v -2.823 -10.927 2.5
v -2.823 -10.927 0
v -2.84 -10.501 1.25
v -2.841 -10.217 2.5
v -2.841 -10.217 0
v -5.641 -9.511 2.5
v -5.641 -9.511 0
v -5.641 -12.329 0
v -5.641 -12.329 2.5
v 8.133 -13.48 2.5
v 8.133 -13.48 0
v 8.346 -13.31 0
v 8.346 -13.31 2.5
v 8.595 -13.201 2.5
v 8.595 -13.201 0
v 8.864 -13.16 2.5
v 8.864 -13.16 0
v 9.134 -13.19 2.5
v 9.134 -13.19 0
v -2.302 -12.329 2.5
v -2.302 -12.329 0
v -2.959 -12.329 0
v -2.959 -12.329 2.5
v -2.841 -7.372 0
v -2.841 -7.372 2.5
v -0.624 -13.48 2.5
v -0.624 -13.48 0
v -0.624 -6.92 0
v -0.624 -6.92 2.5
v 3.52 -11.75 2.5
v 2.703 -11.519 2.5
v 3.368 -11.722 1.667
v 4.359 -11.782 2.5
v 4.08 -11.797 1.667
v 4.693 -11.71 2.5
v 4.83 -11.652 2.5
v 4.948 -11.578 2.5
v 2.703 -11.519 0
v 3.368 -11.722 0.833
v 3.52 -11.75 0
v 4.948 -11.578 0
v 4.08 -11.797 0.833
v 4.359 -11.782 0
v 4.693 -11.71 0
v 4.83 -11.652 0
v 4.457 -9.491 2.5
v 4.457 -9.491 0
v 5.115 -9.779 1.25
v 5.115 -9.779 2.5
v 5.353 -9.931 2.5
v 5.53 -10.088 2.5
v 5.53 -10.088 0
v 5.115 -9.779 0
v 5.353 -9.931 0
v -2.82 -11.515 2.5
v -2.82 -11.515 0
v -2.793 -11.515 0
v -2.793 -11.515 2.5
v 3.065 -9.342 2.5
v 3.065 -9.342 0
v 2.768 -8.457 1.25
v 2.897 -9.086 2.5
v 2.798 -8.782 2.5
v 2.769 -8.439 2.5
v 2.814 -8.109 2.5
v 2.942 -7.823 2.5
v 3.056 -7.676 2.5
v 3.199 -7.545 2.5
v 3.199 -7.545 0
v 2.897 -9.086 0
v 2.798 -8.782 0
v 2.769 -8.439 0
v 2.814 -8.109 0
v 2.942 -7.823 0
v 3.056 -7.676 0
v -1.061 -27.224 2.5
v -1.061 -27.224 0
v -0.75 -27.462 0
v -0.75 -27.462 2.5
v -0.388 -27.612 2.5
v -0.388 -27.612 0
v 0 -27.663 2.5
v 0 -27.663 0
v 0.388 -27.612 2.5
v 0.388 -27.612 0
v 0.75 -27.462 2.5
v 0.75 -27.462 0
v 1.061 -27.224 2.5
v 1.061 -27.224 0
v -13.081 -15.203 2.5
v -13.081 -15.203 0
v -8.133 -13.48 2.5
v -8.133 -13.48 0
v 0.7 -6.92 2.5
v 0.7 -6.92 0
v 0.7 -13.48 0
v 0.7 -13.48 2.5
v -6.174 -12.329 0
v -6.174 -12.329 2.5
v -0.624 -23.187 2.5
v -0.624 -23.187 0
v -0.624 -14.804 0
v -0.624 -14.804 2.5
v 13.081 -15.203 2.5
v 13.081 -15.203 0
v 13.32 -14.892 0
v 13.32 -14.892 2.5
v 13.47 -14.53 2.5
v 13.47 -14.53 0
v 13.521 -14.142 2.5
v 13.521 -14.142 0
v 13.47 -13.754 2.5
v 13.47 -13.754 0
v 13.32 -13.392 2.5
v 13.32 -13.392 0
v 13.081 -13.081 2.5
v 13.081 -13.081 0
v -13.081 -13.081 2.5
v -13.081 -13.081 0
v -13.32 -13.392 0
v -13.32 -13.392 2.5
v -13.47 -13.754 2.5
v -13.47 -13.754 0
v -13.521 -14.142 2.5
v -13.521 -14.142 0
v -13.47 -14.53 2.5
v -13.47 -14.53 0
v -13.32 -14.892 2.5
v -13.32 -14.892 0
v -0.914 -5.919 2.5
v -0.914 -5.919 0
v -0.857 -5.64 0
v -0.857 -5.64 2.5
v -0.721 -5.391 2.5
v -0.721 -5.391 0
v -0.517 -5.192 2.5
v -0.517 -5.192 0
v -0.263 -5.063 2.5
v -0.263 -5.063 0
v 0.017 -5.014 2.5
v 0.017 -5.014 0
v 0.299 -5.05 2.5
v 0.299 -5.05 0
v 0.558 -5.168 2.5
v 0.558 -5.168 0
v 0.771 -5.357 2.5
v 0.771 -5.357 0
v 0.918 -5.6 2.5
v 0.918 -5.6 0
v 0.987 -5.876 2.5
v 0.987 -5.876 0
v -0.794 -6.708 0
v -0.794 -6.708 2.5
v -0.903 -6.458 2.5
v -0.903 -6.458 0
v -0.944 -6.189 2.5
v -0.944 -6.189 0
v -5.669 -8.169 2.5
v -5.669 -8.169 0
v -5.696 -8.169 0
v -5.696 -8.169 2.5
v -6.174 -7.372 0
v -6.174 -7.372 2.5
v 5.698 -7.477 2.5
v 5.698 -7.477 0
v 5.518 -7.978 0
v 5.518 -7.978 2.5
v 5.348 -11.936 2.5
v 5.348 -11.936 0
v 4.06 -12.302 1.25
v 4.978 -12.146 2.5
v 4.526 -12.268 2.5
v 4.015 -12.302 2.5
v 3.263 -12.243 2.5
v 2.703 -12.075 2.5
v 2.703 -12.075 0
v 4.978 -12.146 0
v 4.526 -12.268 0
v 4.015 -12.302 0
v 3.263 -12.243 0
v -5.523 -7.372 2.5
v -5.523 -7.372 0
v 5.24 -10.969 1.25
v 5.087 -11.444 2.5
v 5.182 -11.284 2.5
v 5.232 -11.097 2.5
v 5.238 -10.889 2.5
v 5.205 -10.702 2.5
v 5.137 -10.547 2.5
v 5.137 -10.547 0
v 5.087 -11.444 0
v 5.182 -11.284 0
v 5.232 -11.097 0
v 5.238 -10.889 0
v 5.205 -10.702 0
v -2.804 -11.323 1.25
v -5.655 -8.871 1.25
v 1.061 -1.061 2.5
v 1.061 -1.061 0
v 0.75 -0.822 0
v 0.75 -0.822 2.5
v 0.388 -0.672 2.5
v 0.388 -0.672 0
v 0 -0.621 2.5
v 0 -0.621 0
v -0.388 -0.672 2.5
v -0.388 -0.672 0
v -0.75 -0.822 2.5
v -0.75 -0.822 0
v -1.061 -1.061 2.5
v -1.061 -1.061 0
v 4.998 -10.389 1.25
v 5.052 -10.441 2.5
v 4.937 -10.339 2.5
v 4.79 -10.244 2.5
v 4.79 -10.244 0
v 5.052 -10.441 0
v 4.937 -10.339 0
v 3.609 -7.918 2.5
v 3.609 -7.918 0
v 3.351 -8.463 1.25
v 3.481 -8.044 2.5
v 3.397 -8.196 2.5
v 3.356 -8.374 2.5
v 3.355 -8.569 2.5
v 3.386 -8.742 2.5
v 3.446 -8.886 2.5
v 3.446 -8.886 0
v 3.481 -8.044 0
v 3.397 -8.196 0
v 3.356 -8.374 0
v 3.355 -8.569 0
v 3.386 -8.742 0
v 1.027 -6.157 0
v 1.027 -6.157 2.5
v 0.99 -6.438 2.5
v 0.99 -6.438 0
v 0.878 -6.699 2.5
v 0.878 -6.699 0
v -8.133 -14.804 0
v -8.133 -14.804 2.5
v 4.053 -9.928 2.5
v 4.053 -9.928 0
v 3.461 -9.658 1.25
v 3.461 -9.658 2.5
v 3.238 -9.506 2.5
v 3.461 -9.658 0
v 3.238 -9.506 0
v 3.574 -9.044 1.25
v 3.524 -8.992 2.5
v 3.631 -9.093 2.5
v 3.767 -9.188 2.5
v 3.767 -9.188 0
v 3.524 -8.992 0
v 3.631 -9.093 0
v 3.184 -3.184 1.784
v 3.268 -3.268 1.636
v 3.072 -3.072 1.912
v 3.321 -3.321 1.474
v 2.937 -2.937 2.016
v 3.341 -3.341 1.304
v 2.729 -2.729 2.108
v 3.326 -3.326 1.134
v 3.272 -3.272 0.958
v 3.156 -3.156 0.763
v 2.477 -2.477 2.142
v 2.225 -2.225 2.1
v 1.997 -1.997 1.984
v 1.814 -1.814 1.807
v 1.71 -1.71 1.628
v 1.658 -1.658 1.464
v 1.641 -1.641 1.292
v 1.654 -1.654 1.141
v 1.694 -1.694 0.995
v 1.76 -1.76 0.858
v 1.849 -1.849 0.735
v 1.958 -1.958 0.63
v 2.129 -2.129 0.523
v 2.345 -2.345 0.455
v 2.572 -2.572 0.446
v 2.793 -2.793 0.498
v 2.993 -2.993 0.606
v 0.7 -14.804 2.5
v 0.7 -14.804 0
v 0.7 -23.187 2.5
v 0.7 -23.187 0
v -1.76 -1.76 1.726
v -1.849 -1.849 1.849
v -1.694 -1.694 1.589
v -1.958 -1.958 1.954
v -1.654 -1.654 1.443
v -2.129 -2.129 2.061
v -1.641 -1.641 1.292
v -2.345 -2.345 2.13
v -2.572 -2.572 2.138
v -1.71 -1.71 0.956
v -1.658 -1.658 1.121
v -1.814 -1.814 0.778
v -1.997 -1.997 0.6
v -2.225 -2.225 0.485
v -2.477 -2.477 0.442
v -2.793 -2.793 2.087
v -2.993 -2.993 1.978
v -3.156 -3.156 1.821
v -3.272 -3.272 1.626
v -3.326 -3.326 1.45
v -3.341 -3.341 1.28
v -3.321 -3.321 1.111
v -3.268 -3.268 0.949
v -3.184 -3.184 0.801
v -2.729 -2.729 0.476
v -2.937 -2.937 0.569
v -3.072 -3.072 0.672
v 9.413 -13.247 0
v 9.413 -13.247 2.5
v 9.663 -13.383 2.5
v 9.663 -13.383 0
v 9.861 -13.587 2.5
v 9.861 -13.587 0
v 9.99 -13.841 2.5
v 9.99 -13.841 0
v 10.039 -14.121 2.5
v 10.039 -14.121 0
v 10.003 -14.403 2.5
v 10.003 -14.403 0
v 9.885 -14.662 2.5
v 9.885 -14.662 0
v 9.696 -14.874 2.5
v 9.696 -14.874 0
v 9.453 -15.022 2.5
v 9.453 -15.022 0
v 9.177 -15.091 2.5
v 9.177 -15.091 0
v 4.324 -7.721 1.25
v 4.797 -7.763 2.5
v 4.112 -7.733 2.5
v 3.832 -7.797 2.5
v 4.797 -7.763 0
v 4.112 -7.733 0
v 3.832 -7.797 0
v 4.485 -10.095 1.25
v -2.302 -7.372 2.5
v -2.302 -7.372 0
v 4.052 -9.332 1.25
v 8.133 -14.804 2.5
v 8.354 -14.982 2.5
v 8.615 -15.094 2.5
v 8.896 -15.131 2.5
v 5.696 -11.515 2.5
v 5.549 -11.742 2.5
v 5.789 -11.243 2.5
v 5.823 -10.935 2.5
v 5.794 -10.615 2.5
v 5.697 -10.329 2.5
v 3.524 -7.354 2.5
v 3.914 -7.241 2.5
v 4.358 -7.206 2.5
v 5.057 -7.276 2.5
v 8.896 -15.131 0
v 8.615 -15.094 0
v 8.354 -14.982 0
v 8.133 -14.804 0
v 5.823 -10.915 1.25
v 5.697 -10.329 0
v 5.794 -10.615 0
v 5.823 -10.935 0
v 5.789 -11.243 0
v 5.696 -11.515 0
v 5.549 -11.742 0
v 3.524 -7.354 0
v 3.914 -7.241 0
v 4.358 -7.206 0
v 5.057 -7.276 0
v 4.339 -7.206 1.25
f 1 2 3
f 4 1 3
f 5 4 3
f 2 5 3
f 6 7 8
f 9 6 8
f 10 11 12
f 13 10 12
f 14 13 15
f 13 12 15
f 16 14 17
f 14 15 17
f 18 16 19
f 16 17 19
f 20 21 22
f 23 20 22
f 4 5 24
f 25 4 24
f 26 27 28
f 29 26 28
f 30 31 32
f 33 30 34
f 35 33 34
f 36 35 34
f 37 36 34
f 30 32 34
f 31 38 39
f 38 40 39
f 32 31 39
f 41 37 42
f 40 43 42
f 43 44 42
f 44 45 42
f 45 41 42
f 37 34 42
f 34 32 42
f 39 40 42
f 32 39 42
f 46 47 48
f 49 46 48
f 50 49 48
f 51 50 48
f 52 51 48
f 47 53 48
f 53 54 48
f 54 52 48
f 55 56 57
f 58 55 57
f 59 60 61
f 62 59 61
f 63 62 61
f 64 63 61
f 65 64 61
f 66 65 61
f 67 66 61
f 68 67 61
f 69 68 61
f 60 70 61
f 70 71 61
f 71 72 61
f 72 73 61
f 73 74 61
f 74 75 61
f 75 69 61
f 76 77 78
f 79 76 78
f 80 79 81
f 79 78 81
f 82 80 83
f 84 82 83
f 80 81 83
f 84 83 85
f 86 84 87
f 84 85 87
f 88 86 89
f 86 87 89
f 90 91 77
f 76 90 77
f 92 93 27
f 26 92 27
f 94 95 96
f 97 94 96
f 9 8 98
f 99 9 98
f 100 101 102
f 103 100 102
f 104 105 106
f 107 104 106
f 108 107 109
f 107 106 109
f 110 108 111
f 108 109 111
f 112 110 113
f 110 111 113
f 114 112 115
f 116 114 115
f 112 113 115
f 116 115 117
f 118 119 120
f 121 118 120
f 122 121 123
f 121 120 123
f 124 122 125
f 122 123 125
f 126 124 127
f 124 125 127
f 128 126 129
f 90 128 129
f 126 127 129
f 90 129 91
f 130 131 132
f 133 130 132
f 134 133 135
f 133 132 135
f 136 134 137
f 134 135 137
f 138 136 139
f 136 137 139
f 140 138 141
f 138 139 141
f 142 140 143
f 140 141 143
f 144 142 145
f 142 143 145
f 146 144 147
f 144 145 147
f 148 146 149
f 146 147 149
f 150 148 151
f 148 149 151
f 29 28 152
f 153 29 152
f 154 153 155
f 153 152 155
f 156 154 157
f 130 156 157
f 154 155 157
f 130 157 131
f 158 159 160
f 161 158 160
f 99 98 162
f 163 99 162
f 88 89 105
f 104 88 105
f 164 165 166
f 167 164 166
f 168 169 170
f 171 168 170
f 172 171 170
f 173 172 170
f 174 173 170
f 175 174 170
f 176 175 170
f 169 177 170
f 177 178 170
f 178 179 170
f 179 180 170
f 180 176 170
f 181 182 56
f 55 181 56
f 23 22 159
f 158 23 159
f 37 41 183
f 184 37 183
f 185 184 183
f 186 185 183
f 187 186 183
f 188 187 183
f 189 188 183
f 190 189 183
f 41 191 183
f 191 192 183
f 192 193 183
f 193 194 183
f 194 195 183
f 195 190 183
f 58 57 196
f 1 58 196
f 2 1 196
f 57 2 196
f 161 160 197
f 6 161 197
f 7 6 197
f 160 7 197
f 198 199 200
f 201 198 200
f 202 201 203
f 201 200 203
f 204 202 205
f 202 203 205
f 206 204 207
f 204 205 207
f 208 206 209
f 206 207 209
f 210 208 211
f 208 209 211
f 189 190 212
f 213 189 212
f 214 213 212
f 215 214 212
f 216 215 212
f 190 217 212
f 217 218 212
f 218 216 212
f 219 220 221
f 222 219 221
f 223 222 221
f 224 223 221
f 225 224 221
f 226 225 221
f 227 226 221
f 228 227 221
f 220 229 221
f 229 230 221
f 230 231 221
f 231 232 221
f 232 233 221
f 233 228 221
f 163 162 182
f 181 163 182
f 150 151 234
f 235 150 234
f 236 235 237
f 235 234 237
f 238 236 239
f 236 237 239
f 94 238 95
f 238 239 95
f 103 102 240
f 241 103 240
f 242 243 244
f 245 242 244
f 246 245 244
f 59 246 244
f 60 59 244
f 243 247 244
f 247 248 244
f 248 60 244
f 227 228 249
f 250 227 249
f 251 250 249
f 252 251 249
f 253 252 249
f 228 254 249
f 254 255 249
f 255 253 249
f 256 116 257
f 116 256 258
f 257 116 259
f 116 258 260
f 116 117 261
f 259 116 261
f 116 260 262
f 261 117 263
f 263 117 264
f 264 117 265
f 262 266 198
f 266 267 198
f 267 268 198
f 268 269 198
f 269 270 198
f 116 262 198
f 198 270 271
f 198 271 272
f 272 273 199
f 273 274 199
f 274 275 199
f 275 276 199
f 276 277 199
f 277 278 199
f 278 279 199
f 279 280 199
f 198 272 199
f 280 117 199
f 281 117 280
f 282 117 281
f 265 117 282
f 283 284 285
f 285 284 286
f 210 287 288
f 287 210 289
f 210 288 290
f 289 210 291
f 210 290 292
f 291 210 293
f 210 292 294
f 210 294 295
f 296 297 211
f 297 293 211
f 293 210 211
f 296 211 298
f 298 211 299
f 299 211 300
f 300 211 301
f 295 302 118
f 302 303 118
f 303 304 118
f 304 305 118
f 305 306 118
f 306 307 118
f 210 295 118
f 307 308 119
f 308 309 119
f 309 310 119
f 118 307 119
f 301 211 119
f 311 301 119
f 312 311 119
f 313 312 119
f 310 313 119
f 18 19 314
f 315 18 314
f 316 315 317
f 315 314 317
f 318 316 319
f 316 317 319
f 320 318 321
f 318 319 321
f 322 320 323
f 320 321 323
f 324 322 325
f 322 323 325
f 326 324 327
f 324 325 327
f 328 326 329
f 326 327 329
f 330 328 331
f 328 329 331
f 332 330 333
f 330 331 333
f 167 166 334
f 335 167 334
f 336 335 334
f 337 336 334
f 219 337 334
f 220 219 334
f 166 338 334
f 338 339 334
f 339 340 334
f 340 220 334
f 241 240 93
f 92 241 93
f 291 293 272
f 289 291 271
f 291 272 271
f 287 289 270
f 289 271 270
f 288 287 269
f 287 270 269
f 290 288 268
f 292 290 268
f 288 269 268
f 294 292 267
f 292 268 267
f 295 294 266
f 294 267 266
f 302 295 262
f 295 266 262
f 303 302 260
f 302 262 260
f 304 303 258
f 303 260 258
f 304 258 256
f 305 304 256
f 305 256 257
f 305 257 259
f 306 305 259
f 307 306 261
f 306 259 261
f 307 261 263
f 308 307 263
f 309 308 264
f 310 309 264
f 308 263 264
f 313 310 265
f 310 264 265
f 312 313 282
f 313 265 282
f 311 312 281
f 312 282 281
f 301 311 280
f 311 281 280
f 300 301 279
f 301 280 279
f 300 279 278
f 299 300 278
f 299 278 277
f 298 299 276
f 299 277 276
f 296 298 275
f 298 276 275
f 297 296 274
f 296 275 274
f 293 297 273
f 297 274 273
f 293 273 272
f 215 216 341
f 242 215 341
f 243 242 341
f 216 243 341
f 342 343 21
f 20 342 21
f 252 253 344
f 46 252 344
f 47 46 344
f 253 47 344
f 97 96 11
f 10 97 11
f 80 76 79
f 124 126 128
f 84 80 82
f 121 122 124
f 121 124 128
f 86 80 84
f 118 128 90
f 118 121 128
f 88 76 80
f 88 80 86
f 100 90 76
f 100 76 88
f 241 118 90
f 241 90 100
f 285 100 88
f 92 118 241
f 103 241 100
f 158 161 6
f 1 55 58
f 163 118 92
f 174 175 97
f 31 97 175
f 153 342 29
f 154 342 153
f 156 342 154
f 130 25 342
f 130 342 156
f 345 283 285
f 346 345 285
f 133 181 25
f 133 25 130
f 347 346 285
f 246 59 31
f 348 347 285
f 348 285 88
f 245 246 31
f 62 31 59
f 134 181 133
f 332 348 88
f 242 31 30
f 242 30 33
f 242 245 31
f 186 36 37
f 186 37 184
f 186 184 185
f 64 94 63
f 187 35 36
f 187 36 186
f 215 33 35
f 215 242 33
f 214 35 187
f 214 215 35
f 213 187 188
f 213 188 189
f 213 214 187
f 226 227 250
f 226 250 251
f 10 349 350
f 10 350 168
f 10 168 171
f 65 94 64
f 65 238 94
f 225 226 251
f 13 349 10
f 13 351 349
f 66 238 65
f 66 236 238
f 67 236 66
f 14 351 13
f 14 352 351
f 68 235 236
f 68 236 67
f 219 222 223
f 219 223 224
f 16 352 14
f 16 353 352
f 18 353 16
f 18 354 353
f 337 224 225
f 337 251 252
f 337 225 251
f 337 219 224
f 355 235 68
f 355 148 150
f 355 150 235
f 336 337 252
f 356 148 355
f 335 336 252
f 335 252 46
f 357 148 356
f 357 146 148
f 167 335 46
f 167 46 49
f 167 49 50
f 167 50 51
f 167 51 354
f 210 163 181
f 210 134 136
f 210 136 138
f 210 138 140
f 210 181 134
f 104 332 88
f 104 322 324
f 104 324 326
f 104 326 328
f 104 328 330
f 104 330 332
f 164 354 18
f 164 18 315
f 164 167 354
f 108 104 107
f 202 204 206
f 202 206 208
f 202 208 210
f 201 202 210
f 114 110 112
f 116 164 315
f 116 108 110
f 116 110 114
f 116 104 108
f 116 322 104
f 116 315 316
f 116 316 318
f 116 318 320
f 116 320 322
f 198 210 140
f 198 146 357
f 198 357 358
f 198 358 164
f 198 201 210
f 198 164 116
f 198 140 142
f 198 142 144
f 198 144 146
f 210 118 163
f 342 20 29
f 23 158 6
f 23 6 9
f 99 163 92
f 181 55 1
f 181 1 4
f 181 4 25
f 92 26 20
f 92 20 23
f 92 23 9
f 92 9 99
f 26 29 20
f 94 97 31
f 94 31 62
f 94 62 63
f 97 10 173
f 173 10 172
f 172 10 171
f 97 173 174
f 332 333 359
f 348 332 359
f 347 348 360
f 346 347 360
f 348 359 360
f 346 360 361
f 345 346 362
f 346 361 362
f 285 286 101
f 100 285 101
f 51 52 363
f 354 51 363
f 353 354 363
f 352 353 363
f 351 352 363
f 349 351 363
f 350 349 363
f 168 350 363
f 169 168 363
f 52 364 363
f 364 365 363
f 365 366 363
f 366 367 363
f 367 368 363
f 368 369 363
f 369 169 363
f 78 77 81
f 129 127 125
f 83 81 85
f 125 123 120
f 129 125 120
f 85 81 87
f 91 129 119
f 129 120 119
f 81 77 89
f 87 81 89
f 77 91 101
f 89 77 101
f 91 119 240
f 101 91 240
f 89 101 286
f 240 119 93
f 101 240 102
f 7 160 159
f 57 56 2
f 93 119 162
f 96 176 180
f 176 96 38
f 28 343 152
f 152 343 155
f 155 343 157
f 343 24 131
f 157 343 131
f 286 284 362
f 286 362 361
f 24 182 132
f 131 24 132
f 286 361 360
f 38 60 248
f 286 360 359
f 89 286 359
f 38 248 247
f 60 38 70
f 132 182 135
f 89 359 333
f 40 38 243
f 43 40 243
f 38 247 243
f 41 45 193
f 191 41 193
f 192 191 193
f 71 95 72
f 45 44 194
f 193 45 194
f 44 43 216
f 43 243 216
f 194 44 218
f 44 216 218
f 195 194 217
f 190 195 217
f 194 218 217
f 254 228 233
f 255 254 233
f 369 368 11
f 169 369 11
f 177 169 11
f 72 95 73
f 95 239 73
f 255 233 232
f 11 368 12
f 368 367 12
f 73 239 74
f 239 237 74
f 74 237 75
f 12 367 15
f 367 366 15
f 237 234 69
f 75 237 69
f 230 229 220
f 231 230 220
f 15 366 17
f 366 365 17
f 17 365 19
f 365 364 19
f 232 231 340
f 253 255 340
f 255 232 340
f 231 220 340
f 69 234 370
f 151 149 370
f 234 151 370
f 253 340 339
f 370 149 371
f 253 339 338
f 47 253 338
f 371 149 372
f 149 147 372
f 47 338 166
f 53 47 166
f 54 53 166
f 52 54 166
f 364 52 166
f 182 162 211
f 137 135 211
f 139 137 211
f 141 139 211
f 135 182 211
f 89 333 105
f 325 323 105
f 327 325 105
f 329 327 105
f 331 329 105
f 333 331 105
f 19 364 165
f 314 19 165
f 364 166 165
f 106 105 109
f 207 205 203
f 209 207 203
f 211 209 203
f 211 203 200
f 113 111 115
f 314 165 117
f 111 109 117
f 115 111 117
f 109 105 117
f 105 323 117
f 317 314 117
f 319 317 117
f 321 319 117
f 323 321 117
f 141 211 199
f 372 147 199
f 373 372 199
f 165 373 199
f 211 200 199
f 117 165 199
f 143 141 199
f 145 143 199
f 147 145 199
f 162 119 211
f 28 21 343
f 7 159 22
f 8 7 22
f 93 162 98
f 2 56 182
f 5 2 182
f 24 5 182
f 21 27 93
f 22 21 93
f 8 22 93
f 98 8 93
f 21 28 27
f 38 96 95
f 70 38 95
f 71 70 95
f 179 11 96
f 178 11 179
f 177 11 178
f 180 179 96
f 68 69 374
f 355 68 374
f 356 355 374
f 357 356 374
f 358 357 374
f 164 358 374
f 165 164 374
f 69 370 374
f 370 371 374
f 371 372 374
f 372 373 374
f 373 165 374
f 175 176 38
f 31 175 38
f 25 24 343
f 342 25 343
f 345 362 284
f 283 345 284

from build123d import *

# Parameters (mm, degrees)
F1_DEPTH = 2.5
F2_R     = 0.85
F3_DEPTH = 12.5


with BuildPart() as f1:
    # F0 (on Top) → F1 (new body)
    with BuildSketch(Plane.XY):
        with BuildLine():
            Line((13.081475452, -13.081475452), (1.0606601718, -1.0606601718))
            ThreePointArc((1.0606601718, -1.0606601718), (0, -0.6213203436), (-1.0606601718, -1.0606601718))
            Line((-1.0606601718, -1.0606601718), (-13.081475452, -13.081475452))
            ThreePointArc((-13.081475452, -13.081475452), (-13.5208152802, -14.1421356237), (-13.081475452, -15.2027957955))
            Line((-13.081475452, -15.2027957955), (-1.0606601718, -27.2236110757))
            ThreePointArc((-1.0606601718, -27.2236110757), (0, -27.6629509039), (1.0606601718, -27.2236110757))
            Line((1.0606601718, -27.2236110757), (13.081475452, -15.2027957955))
            ThreePointArc((13.081475452, -15.2027957955), (13.5208152802, -14.1421356237), (13.081475452, -13.081475452))
        make_face()
        with BuildLine():
            Line((-2.3015444974, -7.3716045666), (-2.3015444974, -12.3292868583))
            Line((-2.3015444974, -12.3292868583), (-2.9590965807, -12.3292868583))
            Line((-2.9590965807, -12.3292868583), (-5.6685149835, -8.1691306083))
            Line((-5.6685149835, -8.1691306083), (-5.6956417196, -8.1691306083))
            add(Edge.make_bspline(
                [(-5.6956417196, -8.1691306083), (-5.6413882474, -8.9015524833), (-5.6413882474, -9.5113615111)],
                knots=[0, 0, 0, 1, 1, 1], degree=2))
            Line((-5.6413882474, -9.5113615111), (-5.6413882474, -12.3292868583))
            Line((-5.6413882474, -12.3292868583), (-6.1741573446, -12.3292868583))
            Line((-6.1741573446, -12.3292868583), (-6.1741573446, -7.3716045666))
            Line((-6.1741573446, -7.3716045666), (-5.523115678, -7.3716045666))
            Line((-5.523115678, -7.3716045666), (-2.8202076919, -11.515484775))
            Line((-2.8202076919, -11.515484775), (-2.7930809557, -11.515484775))
            add(Edge.make_bspline(
                [(-2.7930809557, -11.515484775), (-2.7995913724, -11.4243389416), (-2.8234629002, -10.9273771361)],
                knots=[0, 0, 0, 1, 1, 1], degree=2))
            add(Edge.make_bspline(
                [(-2.8234629002, -10.9273771361), (-2.847334428, -10.4304153305), (-2.8408240113, -10.21665665)],
                knots=[0, 0, 0, 1, 1, 1], degree=2))
            Line((-2.8408240113, -10.21665665), (-2.8408240113, -7.3716045666))
            Line((-2.8408240113, -7.3716045666), (-2.3015444974, -7.3716045666))
        make_face(mode=Mode.SUBTRACT)
        with BuildLine():
            Line((-8.1334756687, -14.8039748892), (-8.1334756687, -13.4802963582))
            Line((-8.1334756687, -13.4802963582), (-0.6236797201, -13.4802963582))
            Line((-0.6236797201, -13.4802963582), (-0.6236797201, -6.9198086858))
            ThreePointArc((-0.6236797201, -6.9198086858), (-0.9032194318, -6.4583786209), (-0.9135835525, -5.9189782686))
            ThreePointArc((-0.9135835525, -5.9189782686), (0.0168397474, -5.0141534426), (0.9868078824, -5.876451129))
            ThreePointArc((0.9868078824, -5.876451129), (0.9900106564, -6.4384308628), (0.6999988109, -6.9198086858))
            Line((0.6999988109, -6.9198086858), (0.6999988109, -13.4802963582))
            Line((0.6999988109, -13.4802963582), (8.1334756687, -13.4802963582))
            ThreePointArc((8.1334756687, -13.4802963582), (8.5949057336, -13.2007566465), (9.134306086, -13.1903925258))
            ThreePointArc((9.134306086, -13.1903925258), (10.0391309119, -14.1208158258), (9.1768332255, -15.0907839607))
            ThreePointArc((9.1768332255, -15.0907839607), (8.6148534917, -15.0939867347), (8.1334756687, -14.8039748892))
            Line((8.1334756687, -14.8039748892), (0.6999988109, -14.8039748892))
            Line((0.6999988109, -14.8039748892), (0.6999988109, -23.1867600232))
            Line((0.6999988109, -23.1867600232), (-0.6236797201, -23.1867600232))
            Line((-0.6236797201, -23.1867600232), (-0.6236797201, -14.8039748892))
            Line((-0.6236797201, -14.8039748892), (-8.1334756687, -14.8039748892))
        make_face(mode=Mode.SUBTRACT)
        with BuildLine():
            add(Edge.make_bspline(
                [(5.5299358711, -10.0878473268), (5.8229046211, -10.4068577434), (5.8229046211, -10.9146702434)],
                knots=[0, 0, 0, 1, 1, 1], degree=2))
            add(Edge.make_bspline(
                [(5.8229046211, -10.9146702434), (5.8229046211, -11.5689671184), (5.3481867392, -11.9357205907)],
                knots=[0, 0, 0, 1, 1, 1], degree=2))
            add(Edge.make_bspline(
                [(5.3481867392, -11.9357205907), (4.8734688573, -12.3024740629), (4.0596667739, -12.3024740629)],
                knots=[0, 0, 0, 1, 1, 1], degree=2))
            add(Edge.make_bspline(
                [(4.0596667739, -12.3024740629), (3.178590385, -12.3024740629), (2.7033299684, -12.0746094796)],
                knots=[0, 0, 0, 1, 1, 1], degree=2))
            Line((2.7033299684, -12.0746094796), (2.7033299684, -11.519053924))
            add(Edge.make_bspline(
                [(2.7033299684, -11.519053924), (3.0093195517, -11.6470921184), (3.3684775378, -11.7219619101)],
                knots=[0, 0, 0, 1, 1, 1], degree=2))
            add(Edge.make_bspline(
                [(3.3684775378, -11.7219619101), (3.7276355239, -11.7968317018), (4.0802830934, -11.7968317018)],
                knots=[0, 0, 0, 1, 1, 1], degree=2))
            add(Edge.make_bspline(
                [(4.0802830934, -11.7968317018), (4.6564549684, -11.7968317018), (4.9483386489, -11.5781902087)],
                knots=[0, 0, 0, 1, 1, 1], degree=2))
            add(Edge.make_bspline(
                [(4.9483386489, -11.5781902087), (5.2402223295, -11.3595487157), (5.2402223295, -10.9689237157)],
                knots=[0, 0, 0, 1, 1, 1], degree=2))
            add(Edge.make_bspline(
                [(5.2402223295, -10.9689237157), (5.2402223295, -10.7117622573), (5.1365981975, -10.5473742365)],
                knots=[0, 0, 0, 1, 1, 1], degree=2))
            add(Edge.make_bspline(
                [(5.1365981975, -10.5473742365), (5.0329740656, -10.3829862157), (4.7904610448, -10.2435547921)],
                knots=[0, 0, 0, 1, 1, 1], degree=2))
            add(Edge.make_bspline(
                [(4.7904610448, -10.2435547921), (4.5479480239, -10.1041233684), (4.0531563573, -9.9283421184)],
                knots=[0, 0, 0, 1, 1, 1], degree=2))
            add(Edge.make_bspline(
                [(4.0531563573, -9.9283421184), (3.3619671211, -9.6809462851), (3.0652006281, -9.3418620837)],
                knots=[0, 0, 0, 1, 1, 1], degree=2))
            add(Edge.make_bspline(
                [(3.0652006281, -9.3418620837), (2.768434135, -9.0027778823), (2.768434135, -8.4569879518)],
                knots=[0, 0, 0, 1, 1, 1], degree=2))
            add(Edge.make_bspline(
                [(2.768434135, -8.4569879518), (2.768434135, -7.8840712851), (3.1986641698, -7.5449870837)],
                knots=[0, 0, 0, 1, 1, 1], degree=2))
            add(Edge.make_bspline(
                [(3.1986641698, -7.5449870837), (3.6288942045, -7.2059028823), (4.3385296211, -7.2059028823)],
                knots=[0, 0, 0, 1, 1, 1], degree=2))
            add(Edge.make_bspline(
                [(4.3385296211, -7.2059028823), (5.0774619128, -7.2059028823), (5.698121635, -7.4771702434)],
                knots=[0, 0, 0, 1, 1, 1], degree=2))
            Line((5.698121635, -7.4771702434), (5.5180001073, -7.9784723268))
            add(Edge.make_bspline(
                [(5.5180001073, -7.9784723268), (4.9038508017, -7.7213108684), (4.3244237184, -7.7213108684)],
                knots=[0, 0, 0, 1, 1, 1], degree=2))
            add(Edge.make_bspline(
                [(4.3244237184, -7.7213108684), (3.8665244128, -7.7213108684), (3.6088204198, -7.9177084379)],
                knots=[0, 0, 0, 1, 1, 1], degree=2))
            add(Edge.make_bspline(
                [(3.6088204198, -7.9177084379), (3.3511164267, -8.1141060073), (3.3511164267, -8.4634983684)],
                knots=[0, 0, 0, 1, 1, 1], degree=2))
            add(Edge.make_bspline(
                [(3.3511164267, -8.4634983684), (3.3511164267, -8.7206598268), (3.4460600031, -8.8855903823)],
                knots=[0, 0, 0, 1, 1, 1], degree=2))
            add(Edge.make_bspline(
                [(3.4460600031, -8.8855903823), (3.5410035795, -9.0505209379), (3.7666980239, -9.1877822226)],
                knots=[0, 0, 0, 1, 1, 1], degree=2))
            add(Edge.make_bspline(
                [(3.7666980239, -9.1877822226), (3.9923924684, -9.3250435073), (4.4568021906, -9.4910591323)],
                knots=[0, 0, 0, 1, 1, 1], degree=2))
            add(Edge.make_bspline(
                [(4.4568021906, -9.4910591323), (5.2369671211, -9.7688369101), (5.5299358711, -10.0878473268)],
                knots=[0, 0, 0, 1, 1, 1], degree=2))
        make_face(mode=Mode.SUBTRACT)
    extrude(amount=F1_DEPTH)

    # F2 (on Right) → F3 (cut, symmetric)
    with BuildSketch(Plane.YZ):
        with Locations((-2.4908210296, 1.292226194)):
            Circle(F2_R)
    extrude(amount=F3_DEPTH, both=True, mode=Mode.SUBTRACT)


solid = f1.part
